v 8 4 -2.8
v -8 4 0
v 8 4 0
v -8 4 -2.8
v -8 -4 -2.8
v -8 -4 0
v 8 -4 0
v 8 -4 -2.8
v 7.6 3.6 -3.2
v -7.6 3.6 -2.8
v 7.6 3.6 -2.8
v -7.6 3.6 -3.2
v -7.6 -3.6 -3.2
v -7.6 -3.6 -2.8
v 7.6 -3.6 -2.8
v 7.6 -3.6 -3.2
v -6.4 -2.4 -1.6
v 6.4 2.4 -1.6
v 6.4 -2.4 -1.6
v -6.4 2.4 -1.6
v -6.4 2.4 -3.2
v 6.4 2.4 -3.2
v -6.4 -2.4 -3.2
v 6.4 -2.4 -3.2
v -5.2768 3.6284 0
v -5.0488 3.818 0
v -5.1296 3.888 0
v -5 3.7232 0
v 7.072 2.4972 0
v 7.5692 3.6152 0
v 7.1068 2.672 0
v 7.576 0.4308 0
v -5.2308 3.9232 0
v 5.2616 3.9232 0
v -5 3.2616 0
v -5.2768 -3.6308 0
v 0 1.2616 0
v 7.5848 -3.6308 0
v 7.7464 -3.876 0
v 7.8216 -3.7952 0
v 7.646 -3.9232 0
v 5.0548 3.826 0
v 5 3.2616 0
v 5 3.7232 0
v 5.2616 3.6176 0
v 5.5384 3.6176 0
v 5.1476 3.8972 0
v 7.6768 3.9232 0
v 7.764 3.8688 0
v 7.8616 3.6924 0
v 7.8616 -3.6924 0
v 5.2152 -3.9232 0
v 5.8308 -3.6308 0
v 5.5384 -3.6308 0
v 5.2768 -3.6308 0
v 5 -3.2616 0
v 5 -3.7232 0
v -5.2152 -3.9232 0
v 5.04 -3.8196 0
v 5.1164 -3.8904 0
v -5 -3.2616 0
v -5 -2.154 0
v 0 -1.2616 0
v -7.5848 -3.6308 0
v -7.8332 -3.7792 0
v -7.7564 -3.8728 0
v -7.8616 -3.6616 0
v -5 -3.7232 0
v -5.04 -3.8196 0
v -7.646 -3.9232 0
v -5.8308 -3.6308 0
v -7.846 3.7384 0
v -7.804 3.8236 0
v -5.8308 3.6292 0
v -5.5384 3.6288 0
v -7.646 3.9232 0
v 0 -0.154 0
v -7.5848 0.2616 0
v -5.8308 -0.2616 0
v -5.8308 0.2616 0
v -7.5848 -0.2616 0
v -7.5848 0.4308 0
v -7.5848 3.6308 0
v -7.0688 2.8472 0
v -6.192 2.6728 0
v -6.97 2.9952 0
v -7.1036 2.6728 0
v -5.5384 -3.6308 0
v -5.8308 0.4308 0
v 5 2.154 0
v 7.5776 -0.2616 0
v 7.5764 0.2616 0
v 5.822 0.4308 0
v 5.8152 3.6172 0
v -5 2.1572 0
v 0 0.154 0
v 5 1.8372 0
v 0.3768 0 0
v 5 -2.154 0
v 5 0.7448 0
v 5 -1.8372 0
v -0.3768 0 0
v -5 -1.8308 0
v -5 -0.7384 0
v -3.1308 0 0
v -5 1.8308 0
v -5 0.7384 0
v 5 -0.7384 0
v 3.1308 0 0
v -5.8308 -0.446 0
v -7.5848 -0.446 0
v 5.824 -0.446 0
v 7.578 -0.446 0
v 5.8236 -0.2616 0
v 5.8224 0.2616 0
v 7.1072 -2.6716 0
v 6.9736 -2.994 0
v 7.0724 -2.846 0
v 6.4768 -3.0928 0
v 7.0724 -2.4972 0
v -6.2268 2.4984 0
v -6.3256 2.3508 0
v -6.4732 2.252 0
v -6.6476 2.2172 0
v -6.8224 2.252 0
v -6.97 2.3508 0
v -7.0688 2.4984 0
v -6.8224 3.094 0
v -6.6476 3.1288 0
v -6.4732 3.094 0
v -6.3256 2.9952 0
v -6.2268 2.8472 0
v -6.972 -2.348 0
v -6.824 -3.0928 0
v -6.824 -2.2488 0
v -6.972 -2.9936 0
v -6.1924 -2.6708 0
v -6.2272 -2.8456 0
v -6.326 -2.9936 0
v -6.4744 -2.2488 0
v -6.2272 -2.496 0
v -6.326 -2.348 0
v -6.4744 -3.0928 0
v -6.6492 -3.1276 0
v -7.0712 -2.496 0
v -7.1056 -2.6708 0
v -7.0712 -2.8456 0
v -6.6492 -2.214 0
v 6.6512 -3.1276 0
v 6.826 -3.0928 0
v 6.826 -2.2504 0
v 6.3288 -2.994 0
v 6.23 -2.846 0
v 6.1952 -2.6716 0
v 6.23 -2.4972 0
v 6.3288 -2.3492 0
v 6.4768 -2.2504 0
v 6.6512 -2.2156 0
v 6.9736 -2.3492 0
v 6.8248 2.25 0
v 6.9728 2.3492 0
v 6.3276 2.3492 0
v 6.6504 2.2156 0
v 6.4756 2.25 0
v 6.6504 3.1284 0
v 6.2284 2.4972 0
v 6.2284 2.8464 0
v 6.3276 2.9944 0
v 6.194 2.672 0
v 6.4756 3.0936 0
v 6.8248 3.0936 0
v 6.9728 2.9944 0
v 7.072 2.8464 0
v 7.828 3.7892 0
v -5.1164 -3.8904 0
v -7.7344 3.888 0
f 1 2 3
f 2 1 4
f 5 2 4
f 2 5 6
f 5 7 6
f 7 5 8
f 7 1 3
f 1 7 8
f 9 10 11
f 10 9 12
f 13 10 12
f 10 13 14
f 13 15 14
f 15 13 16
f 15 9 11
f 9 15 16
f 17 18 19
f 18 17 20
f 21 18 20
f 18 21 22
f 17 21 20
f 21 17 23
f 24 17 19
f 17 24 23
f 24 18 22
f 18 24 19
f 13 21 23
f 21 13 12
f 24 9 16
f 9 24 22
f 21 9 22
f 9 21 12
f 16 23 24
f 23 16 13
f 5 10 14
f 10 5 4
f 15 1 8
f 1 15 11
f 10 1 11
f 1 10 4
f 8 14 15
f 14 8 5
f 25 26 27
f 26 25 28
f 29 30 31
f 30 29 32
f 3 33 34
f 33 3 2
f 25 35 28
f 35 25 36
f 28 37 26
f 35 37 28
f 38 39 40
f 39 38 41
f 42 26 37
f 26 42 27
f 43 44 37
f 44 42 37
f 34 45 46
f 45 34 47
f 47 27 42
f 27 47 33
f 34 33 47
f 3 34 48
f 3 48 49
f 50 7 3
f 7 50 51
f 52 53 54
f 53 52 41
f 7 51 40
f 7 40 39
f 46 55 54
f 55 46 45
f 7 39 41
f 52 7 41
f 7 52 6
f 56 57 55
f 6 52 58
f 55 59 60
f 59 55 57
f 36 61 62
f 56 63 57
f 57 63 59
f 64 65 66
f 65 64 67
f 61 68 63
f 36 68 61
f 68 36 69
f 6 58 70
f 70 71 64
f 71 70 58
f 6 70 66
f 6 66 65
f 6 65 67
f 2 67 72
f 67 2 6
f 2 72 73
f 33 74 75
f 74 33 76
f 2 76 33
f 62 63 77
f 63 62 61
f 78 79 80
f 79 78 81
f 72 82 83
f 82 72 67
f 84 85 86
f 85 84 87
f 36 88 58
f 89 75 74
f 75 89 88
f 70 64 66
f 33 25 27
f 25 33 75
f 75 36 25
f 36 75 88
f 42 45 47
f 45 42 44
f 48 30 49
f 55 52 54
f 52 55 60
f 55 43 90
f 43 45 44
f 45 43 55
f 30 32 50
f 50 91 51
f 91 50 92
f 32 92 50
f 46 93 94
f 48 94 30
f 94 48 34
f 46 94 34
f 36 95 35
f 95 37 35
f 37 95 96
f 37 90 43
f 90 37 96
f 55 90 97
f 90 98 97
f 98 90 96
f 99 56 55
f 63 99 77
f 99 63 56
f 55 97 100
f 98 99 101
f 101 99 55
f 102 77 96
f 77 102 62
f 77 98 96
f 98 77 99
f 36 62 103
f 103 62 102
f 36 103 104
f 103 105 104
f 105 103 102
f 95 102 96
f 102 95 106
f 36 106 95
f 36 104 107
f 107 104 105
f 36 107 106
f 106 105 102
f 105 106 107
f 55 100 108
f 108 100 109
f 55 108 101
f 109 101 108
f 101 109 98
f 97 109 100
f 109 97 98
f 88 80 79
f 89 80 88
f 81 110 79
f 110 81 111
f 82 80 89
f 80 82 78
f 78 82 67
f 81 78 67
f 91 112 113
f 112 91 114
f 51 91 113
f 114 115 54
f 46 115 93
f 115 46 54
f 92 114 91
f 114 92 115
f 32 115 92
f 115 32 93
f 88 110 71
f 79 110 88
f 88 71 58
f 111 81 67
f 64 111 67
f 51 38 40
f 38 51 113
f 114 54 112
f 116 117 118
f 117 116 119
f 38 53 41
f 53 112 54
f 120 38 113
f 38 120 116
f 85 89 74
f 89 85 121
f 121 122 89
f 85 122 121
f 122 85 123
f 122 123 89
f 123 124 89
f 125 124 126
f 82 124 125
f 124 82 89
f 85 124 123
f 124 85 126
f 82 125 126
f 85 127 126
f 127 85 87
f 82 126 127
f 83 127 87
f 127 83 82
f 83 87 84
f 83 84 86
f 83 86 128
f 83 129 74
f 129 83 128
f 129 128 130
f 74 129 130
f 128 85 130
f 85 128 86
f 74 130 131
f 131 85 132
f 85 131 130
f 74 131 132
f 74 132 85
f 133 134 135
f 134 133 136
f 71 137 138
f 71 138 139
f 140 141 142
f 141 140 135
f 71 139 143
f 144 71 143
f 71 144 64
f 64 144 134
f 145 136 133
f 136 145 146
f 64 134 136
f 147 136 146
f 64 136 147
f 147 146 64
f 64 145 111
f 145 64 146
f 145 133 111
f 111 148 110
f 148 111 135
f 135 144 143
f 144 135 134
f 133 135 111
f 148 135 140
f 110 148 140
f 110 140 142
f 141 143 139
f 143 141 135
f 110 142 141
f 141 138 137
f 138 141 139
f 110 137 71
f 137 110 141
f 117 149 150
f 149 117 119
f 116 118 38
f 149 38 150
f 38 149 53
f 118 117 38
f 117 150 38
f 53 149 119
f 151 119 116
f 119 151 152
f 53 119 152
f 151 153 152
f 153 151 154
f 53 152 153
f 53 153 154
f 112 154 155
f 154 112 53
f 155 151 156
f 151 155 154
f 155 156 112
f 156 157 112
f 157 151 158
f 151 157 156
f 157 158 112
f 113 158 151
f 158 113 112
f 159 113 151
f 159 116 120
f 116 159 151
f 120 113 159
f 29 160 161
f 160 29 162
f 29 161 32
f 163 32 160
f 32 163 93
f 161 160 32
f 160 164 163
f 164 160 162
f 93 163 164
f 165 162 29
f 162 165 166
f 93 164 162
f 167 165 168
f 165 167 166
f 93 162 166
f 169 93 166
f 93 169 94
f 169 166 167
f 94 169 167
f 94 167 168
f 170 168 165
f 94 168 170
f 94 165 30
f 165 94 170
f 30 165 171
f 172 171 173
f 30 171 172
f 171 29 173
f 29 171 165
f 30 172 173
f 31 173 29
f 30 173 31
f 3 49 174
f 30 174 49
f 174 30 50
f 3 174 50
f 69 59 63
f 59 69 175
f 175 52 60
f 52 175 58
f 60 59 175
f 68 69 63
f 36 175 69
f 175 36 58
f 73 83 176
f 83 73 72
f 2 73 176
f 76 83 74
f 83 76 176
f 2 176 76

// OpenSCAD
// file: ../p/box5.scad
use <../lib.scad>
function ldraw_lib__box5() = [
// 0 Box with 5 Faces and All Edges
// 0 Name: box5.dat
// 0 Author: James Jessiman
// 0 !LDRAW_ORG Primitive UPDATE 2012-01
// 0 !LICENSE Licensed under CC BY 2.0 and CC BY 4.0 : see CAreadme.txt
// 
// 0 BFC CERTIFY CCW
  [0,"BFC","CERTIFY"],
  [0,"BFC","CCW"],
// 
// 0 !HISTORY 2002-04-03 [sbliss] Modified for BFC compliance
// 0 !HISTORY 2002-04-25 [PTadmin] Official Update 2002-02
// 0 !HISTORY 2007-06-24 [PTadmin] Header formatted for Contributor Agreement
// 0 !HISTORY 2008-07-01 [PTadmin] Official Update 2008-01
// 0 !HISTORY 2012-02-16 [Philo] Changed to CCW
// 0 !HISTORY 2012-03-30 [PTadmin] Official Update 2012-01
// 
// 
// 2 24 1 1 1 -1 1 1
  [2,24,1,1,1,-1,1,1],
// 2 24 -1 1 1 -1 1 -1
  [2,24,-1,1,1,-1,1,-1],
// 2 24 -1 1 -1 1 1 -1
  [2,24,-1,1,-1,1,1,-1],
// 2 24 1 1 -1 1 1 1
  [2,24,1,1,-1,1,1,1],
// 2 24 1 0 1 -1 0 1
  [2,24,1,0,1,-1,0,1],
// 2 24 -1 0 1 -1 0 -1
  [2,24,-1,0,1,-1,0,-1],
// 2 24 -1 0 -1 1 0 -1
  [2,24,-1,0,-1,1,0,-1],
// 2 24 1 0 -1 1 0 1
  [2,24,1,0,-1,1,0,1],
// 2 24 1 0 1 1 1 1
  [2,24,1,0,1,1,1,1],
// 2 24 -1 0 1 -1 1 1
  [2,24,-1,0,1,-1,1,1],
// 2 24 1 0 -1 1 1 -1
  [2,24,1,0,-1,1,1,-1],
// 2 24 -1 0 -1 -1 1 -1
  [2,24,-1,0,-1,-1,1,-1],
// 4 16 -1 1 1 1 1 1 1 1 -1 -1 1 -1
  [4,16,-1,1,1,1,1,1,1,1,-1,-1,1,-1],
// 4 16 -1 1 1 -1 0 1 1 0 1 1 1 1
  [4,16,-1,1,1,-1,0,1,1,0,1,1,1,1],
// 4 16 -1 1 -1 -1 0 -1 -1 0 1 -1 1 1
  [4,16,-1,1,-1,-1,0,-1,-1,0,1,-1,1,1],
// 4 16 1 1 -1 1 0 -1 -1 0 -1 -1 1 -1
  [4,16,1,1,-1,1,0,-1,-1,0,-1,-1,1,-1],
// 4 16 1 1 1 1 0 1 1 0 -1 1 1 -1
  [4,16,1,1,1,1,0,1,1,0,-1,1,1,-1],
];
module ldraw_lib__box5(step=0, col=false, unit=2/5, alt=false, line=0.2, solid=!$preview)
    makepoly(ldraw_lib__box5(), step=step, col=col, unit=unit, alt=alt, line=line, solid=solid);
ldraw_lib__box5(line=0.2);
// file: ../p/box4.scad
use <../lib.scad>
function ldraw_lib__box4() = [
// 0 Box with 4 Faces (2 Parallel Pairs) and All Edges
// 0 Name: box4.dat
// 0 Author: James Jessiman
// 0 !LDRAW_ORG Primitive UPDATE 2012-01
// 0 !LICENSE Licensed under CC BY 2.0 and CC BY 4.0 : see CAreadme.txt
// 
// 0 BFC CERTIFY CCW
  [0,"BFC","CERTIFY"],
  [0,"BFC","CCW"],
// 
// 0 !HISTORY 2002-04-03 [sbliss] Modified for BFC compliance
// 0 !HISTORY 2002-04-25 [PTadmin] Official Update 2002-02
// 0 !HISTORY 2007-06-24 [PTadmin] Header formatted for Contributor Agreement
// 0 !HISTORY 2008-07-01 [PTadmin] Official Update 2008-01
// 0 !HISTORY 2012-02-16 [Philo] Changed to CCW
// 0 !HISTORY 2012-03-30 [PTadmin] Official Update 2012-01
// 
// 
// 2 24 1 1 1 -1 1 1
  [2,24,1,1,1,-1,1,1],
// 2 24 -1 1 1 -1 1 -1
  [2,24,-1,1,1,-1,1,-1],
// 2 24 -1 1 -1 1 1 -1
  [2,24,-1,1,-1,1,1,-1],
// 2 24 1 1 -1 1 1 1
  [2,24,1,1,-1,1,1,1],
// 2 24 1 0 1 -1 0 1
  [2,24,1,0,1,-1,0,1],
// 2 24 -1 0 1 -1 0 -1
  [2,24,-1,0,1,-1,0,-1],
// 2 24 -1 0 -1 1 0 -1
  [2,24,-1,0,-1,1,0,-1],
// 2 24 1 0 -1 1 0 1
  [2,24,1,0,-1,1,0,1],
// 2 24 1 0 1 1 1 1
  [2,24,1,0,1,1,1,1],
// 2 24 -1 0 1 -1 1 1
  [2,24,-1,0,1,-1,1,1],
// 2 24 1 0 -1 1 1 -1
  [2,24,1,0,-1,1,1,-1],
// 2 24 -1 0 -1 -1 1 -1
  [2,24,-1,0,-1,-1,1,-1],
// 4 16 -1 1 1 -1 0 1 1 0 1 1 1 1
  [4,16,-1,1,1,-1,0,1,1,0,1,1,1,1],
// 4 16 -1 1 -1 -1 0 -1 -1 0 1 -1 1 1
  [4,16,-1,1,-1,-1,0,-1,-1,0,1,-1,1,1],
// 4 16 1 1 -1 1 0 -1 -1 0 -1 -1 1 -1
  [4,16,1,1,-1,1,0,-1,-1,0,-1,-1,1,-1],
// 4 16 1 1 1 1 0 1 1 0 -1 1 1 -1
  [4,16,1,1,1,1,0,1,1,0,-1,1,1,-1],
];
module ldraw_lib__box4(step=0, col=false, unit=2/5, alt=false, line=0.2, solid=!$preview)
    makepoly(ldraw_lib__box4(), step=step, col=col, unit=unit, alt=alt, line=line, solid=solid);
ldraw_lib__box4(line=0.2);
// file: s/3069bs01.scad
use <../../lib.scad>
use <../../p/box4.scad>
use <../../p/box5.scad>
function ldraw_lib__s__3069bs01() = [
// 0 ~Tile  1 x  2 with Groove without Top Face
// 0 Name: s\3069bs01.dat
// 0 Author: Santeri Piippo [arezey]
// 0 !LDRAW_ORG Subpart UPDATE 2010-02
// 0 !LICENSE Licensed under CC BY 2.0 and CC BY 4.0 : see CAreadme.txt
// 
// 0 BFC CERTIFY CCW
  [0,"BFC","CERTIFY"],
  [0,"BFC","CCW"],
// 
// 0 !HISTORY 2010-07-05 [PTadmin] Official Update 2010-02
// 
// 
// 1 16 0 0 0 20 0 0 0 7 0 0 0 10 box4.dat
  [1,16,0,0,0,20,0,0,0,7,0,0,0,10, ldraw_lib__box4()],
// 1 16 0 7 0 19 0 0 0 1 0 0 0 9 box4.dat
  [1,16,0,7,0,19,0,0,0,1,0,0,0,9, ldraw_lib__box4()],
// 0 BFC INVERTNEXT
  [0,"BFC","INVERTNEXT"],
// 1 16 0 8 0 16 0 0 0 -4 0 0 0 6 box5.dat
  [1,16,0,8,0,16,0,0,0,-4,0,0,0,6, ldraw_lib__box5()],
// 4 16 -19 8 9 -16 8 6 -16 8 -6 -19 8 -9
  [4,16,-19,8,9,-16,8,6,-16,8,-6,-19,8,-9],
// 4 16 19 8 -9 16 8 -6 16 8 6 19 8 9
  [4,16,19,8,-9,16,8,-6,16,8,6,19,8,9],
// 4 16 19 8 9 16 8 6 -16 8 6 -19 8 9
  [4,16,19,8,9,16,8,6,-16,8,6,-19,8,9],
// 4 16 -19 8 -9 -16 8 -6 16 8 -6 19 8 -9
  [4,16,-19,8,-9,-16,8,-6,16,8,-6,19,8,-9],
// 4 16 -20 7 10 -19 7 9 -19 7 -9 -20 7 -10
  [4,16,-20,7,10,-19,7,9,-19,7,-9,-20,7,-10],
// 4 16 20 7 -10 19 7 -9 19 7 9 20 7 10
  [4,16,20,7,-10,19,7,-9,19,7,9,20,7,10],
// 4 16 20 7 10 19 7 9 -19 7 9 -20 7 10
  [4,16,20,7,10,19,7,9,-19,7,9,-20,7,10],
// 4 16 -20 7 -10 -19 7 -9 19 7 -9 20 7 -10
  [4,16,-20,7,-10,-19,7,-9,19,7,-9,20,7,-10],
// 0 //
];
module ldraw_lib__s__3069bs01(step=0, col=false, unit=2/5, alt=false, line=0.2, solid=!$preview)
    makepoly(ldraw_lib__s__3069bs01(), step=step, col=col, unit=unit, alt=alt, line=line, solid=solid);
ldraw_lib__s__3069bs01(line=0.2);
// main file
use <../lib.scad>
use <s/3069bs01.scad>
function ldraw_lib__3069bpb2() = [
// 0 Tile  1 x  2 with Black and Dark Bluish Grey Crossed Lines and 4 Rivets Pattern
// 0 Name: 3069bpb2.dat
// 0 Author: Rolf Osterthun [Rolf]
// 0 !LDRAW_ORG Part UPDATE 2022-04
// 0 !LICENSE Licensed under CC BY 2.0 and CC BY 4.0 : see CAreadme.txt
// 
// 0 BFC CERTIFY CCW
  [0,"BFC","CERTIFY"],
  [0,"BFC","CCW"],
// 
// 0 !KEYWORDS BrickLink 3069bpb1037, Set 76202
// 
// 0 !HISTORY 2022-07-18 [PTadmin] Official Update 2022-04
// 
// 
// 1 16 0 0 0 1 0 0 0 1 0 0 0 1 s\3069bs01.dat
  [1,16,0,0,0,1,0,0,0,1,0,0,0,1, ldraw_lib__s__3069bs01()],
// 
// 4 0 -12.824 0 9.72 -13.192 0 9.071 -12.5 0 9.308 -12.622 0 9.545
  [4,0,-12.824,0,9.72,-13.192,0,9.071,-12.5,0,9.308,-12.622,0,9.545],
// 4 72 17.767 0 6.68 17.68 0 6.243 18.94 0 1.077 18.923 0 9.038
  [4,72,17.767,0,6.68,17.68,0,6.243,18.94,0,1.077,18.923,0,9.038],
// 4 16 13.154 0 9.808 20 0 10 -20 0 10 -13.077 0 9.808
  [4,16,13.154,0,9.808,20,0,10,-20,0,10,-13.077,0,9.808],
// 4 0 -13.192 0 -9.077 -12.5 0 8.154 -12.5 0 9.308 -13.192 0 9.071
  [4,0,-13.192,0,-9.077,-12.5,0,8.154,-12.5,0,9.308,-13.192,0,9.071],
// 3 16 -12.5 0 9.308 0 0 3.154 -12.622 0 9.545
  [3,16,-12.5,0,9.308,0,0,3.154,-12.622,0,9.545],
// 3 16 -12.5 0 8.154 0 0 3.154 -12.5 0 9.308
  [3,16,-12.5,0,8.154,0,0,3.154,-12.5,0,9.308],
// 4 0 19.554 0 -9.488 18.962 0 -9.077 19.115 0 -9.808 19.366 0 -9.69
  [4,0,19.554,0,-9.488,18.962,0,-9.077,19.115,0,-9.808,19.366,0,-9.69],
// 4 16 -12.824 0 9.72 -12.622 0 9.545 0 0 3.154 12.637 0 9.565
  [4,16,-12.824,0,9.72,-12.622,0,9.545,0,0,3.154,12.637,0,9.565],
// 3 16 12.5 0 8.154 12.5 0 9.308 0 0 3.154
  [3,16,12.5,0,8.154,12.5,0,9.308,0,0,3.154],
// 3 16 12.5 0 9.308 12.637 0 9.565 0 0 3.154
  [3,16,12.5,0,9.308,12.637,0,9.565,0,0,3.154],
// 4 0 13.846 0 9.044 13.154 0 9.808 12.869 0 9.743 13.154 0 9.044
  [4,0,13.846,0,9.044,13.154,0,9.808,12.869,0,9.743,13.154,0,9.044],
// 4 16 -13.077 0 9.808 -12.824 0 9.72 12.637 0 9.565 12.869 0 9.743
  [4,16,-13.077,0,9.808,-12.824,0,9.72,12.637,0,9.565,12.869,0,9.743],
// 3 16 13.154 0 9.808 -13.077 0 9.808 12.869 0 9.743
  [3,16,13.154,0,9.808,-13.077,0,9.808,12.869,0,9.743],
// 3 16 20 0 10 13.154 0 9.808 19.192 0 9.808
  [3,16,20,0,10,13.154,0,9.808,19.192,0,9.808],
// 3 16 20 0 10 19.192 0 9.808 19.41 0 9.672
  [3,16,20,0,10,19.192,0,9.808,19.41,0,9.672],
// 4 16 19.654 0 -9.231 20 0 -10 20 0 10 19.654 0 9.231
  [4,16,19.654,0,-9.231,20,0,-10,20,0,10,19.654,0,9.231],
// 4 0 14.577 0 -9.077 13.846 0 -9.077 13.038 0 -9.808 19.115 0 -9.808
  [4,0,14.577,0,-9.077,13.846,0,-9.077,13.038,0,-9.808,19.115,0,-9.808],
// 3 16 20 0 -10 19.654 0 -9.231 19.554 0 -9.488
  [3,16,20,0,-10,19.654,0,-9.231,19.554,0,-9.488],
// 3 16 20 0 -10 19.554 0 -9.488 19.366 0 -9.69
  [3,16,20,0,-10,19.554,0,-9.488,19.366,0,-9.69],
// 4 72 13.154 0 9.044 13.192 0 -9.077 13.846 0 -9.077 13.846 0 9.044
  [4,72,13.154,0,9.044,13.192,0,-9.077,13.846,0,-9.077,13.846,0,9.044],
// 3 16 20 0 -10 19.366 0 -9.69 19.115 0 -9.808
  [3,16,20,0,-10,19.366,0,-9.69,19.115,0,-9.808],
// 4 16 19.115 0 -9.808 13.038 0 -9.808 -20 0 -10 20 0 -10
  [4,16,19.115,0,-9.808,13.038,0,-9.808,-20,0,-10,20,0,-10],
// 3 0 12.5 0 -8.154 12.5 0 -9.308 13.192 0 -9.077
  [3,0,12.5,0,-8.154,12.5,0,-9.308,13.192,0,-9.077],
// 3 16 -20 0 -10 13.038 0 -9.808 -13.038 0 -9.808
  [3,16,-20,0,-10,13.038,0,-9.808,-13.038,0,-9.808],
// 4 0 12.5 0 -9.308 12.6 0 -9.549 12.791 0 -9.726 13.192 0 -9.077
  [4,0,12.5,0,-9.308,12.6,0,-9.549,12.791,0,-9.726,13.192,0,-9.077],
// 3 0 -13.192 0 -9.077 -12.5 0 -8.154 -12.5 0 -5.385
  [3,0,-13.192,0,-9.077,-12.5,0,-8.154,-12.5,0,-5.385],
// 3 16 12.5 0 -8.154 0 0 -3.154 12.5 0 -9.308
  [3,16,12.5,0,-8.154,0,0,-3.154,12.5,0,-9.308],
// 3 16 12.5 0 -9.308 0 0 -3.154 12.6 0 -9.549
  [3,16,12.5,0,-9.308,0,0,-3.154,12.6,0,-9.549],
// 4 0 -19.654 0 -9.154 -19.583 0 -9.448 -19.391 0 -9.682 -18.962 0 -9.077
  [4,0,-19.654,0,-9.154,-19.583,0,-9.448,-19.391,0,-9.682,-18.962,0,-9.077],
// 3 16 -12.5 0 -8.154 -12.5 0 -9.308 0 0 -3.154
  [3,16,-12.5,0,-8.154,-12.5,0,-9.308,0,0,-3.154],
// 4 0 -12.5 0 -8.154 -13.192 0 -9.077 -12.6 0 -9.549 -12.5 0 -9.308
  [4,0,-12.5,0,-8.154,-13.192,0,-9.077,-12.6,0,-9.549,-12.5,0,-9.308],
// 3 16 -20 0 -10 -13.038 0 -9.808 -19.115 0 -9.808
  [3,16,-20,0,-10,-13.038,0,-9.808,-19.115,0,-9.808],
// 4 0 -18.962 0 -9.077 -19.115 0 -9.808 -13.038 0 -9.808 -14.577 0 -9.077
  [4,0,-18.962,0,-9.077,-19.115,0,-9.808,-13.038,0,-9.808,-14.577,0,-9.077],
// 3 16 -20 0 -10 -19.115 0 -9.808 -19.391 0 -9.682
  [3,16,-20,0,-10,-19.115,0,-9.808,-19.391,0,-9.682],
// 3 16 -20 0 -10 -19.391 0 -9.682 -19.583 0 -9.448
  [3,16,-20,0,-10,-19.391,0,-9.682,-19.583,0,-9.448],
// 3 16 -20 0 -10 -19.583 0 -9.448 -19.654 0 -9.154
  [3,16,-20,0,-10,-19.583,0,-9.448,-19.654,0,-9.154],
// 4 16 -19.615 0 9.346 -20 0 10 -20 0 -10 -19.654 0 -9.154
  [4,16,-19.615,0,9.346,-20,0,10,-20,0,-10,-19.654,0,-9.154],
// 3 16 -20 0 10 -19.615 0 9.346 -19.51 0 9.559
  [3,16,-20,0,10,-19.615,0,9.346,-19.51,0,9.559],
// 4 0 -13.846 0 9.072 -13.077 0 9.808 -19.115 0 9.808 -14.577 0 9.073
  [4,0,-13.846,0,9.072,-13.077,0,9.808,-19.115,0,9.808,-14.577,0,9.073],
// 3 16 -20 0 10 -19.115 0 9.808 -13.077 0 9.808
  [3,16,-20,0,10,-19.115,0,9.808,-13.077,0,9.808],
// 4 0 -12.5 0 -5.385 -12.5 0 -8.154 0 0 -3.154 0 0 -.385
  [4,0,-12.5,0,-5.385,-12.5,0,-8.154,0,0,-3.154,0,0,-.385],
// 4 72 -18.962 0 .654 -18.962 0 -.654 -14.577 0 -.654 -14.577 0 .654
  [4,72,-18.962,0,.654,-18.962,0,-.654,-14.577,0,-.654,-14.577,0,.654],
// 4 0 -18.962 0 9.077 -19.615 0 9.346 -19.654 0 -9.154 -18.962 0 1.077
  [4,0,-18.962,0,9.077,-19.615,0,9.346,-19.654,0,-9.154,-18.962,0,1.077],
// 4 0 -17.425 0 7.488 -17.672 0 7.118 -17.759 0 6.682 -15.48 0 6.682
  [4,0,-17.425,0,7.488,-17.672,0,7.118,-17.759,0,6.682,-15.48,0,6.682],
// 3 0 -13.192 0 -9.077 -13.846 0 -9.077 -13.038 0 -9.808
  [3,0,-13.192,0,-9.077,-13.846,0,-9.077,-13.038,0,-9.808],
// 4 0 -13.846 0 9.072 -14.577 0 9.073 -14.577 0 1.077 -13.846 0 -9.077
  [4,0,-13.846,0,9.072,-14.577,0,9.073,-14.577,0,1.077,-13.846,0,-9.077],
// 3 0 -19.115 0 -9.808 -18.962 0 -9.077 -19.391 0 -9.682
  [3,0,-19.115,0,-9.808,-18.962,0,-9.077,-19.391,0,-9.682],
// 4 0 -12.824 0 9.72 -13.077 0 9.808 -13.846 0 9.072 -13.192 0 9.071
  [4,0,-12.824,0,9.72,-13.077,0,9.808,-13.846,0,9.072,-13.192,0,9.071],
// 4 72 -13.192 0 -9.077 -13.192 0 9.071 -13.846 0 9.072 -13.846 0 -9.077
  [4,72,-13.192,0,-9.077,-13.192,0,9.071,-13.846,0,9.072,-13.846,0,-9.077],
// 4 0 12.869 0 9.743 12.637 0 9.565 12.5 0 9.308 13.154 0 9.044
  [4,0,12.869,0,9.743,12.637,0,9.565,12.5,0,9.308,13.154,0,9.044],
// 3 0 19.192 0 9.808 18.923 0 9.038 19.41 0 9.672
  [3,0,19.192,0,9.808,18.923,0,9.038,19.41,0,9.672],
// 4 0 12.791 0 -9.726 13.038 0 -9.808 13.846 0 -9.077 13.192 0 -9.077
  [4,0,12.791,0,-9.726,13.038,0,-9.808,13.846,0,-9.077,13.192,0,-9.077],
// 3 0 13.192 0 -9.077 12.5 0 8.154 12.5 0 5.385
  [3,0,13.192,0,-9.077,12.5,0,8.154,12.5,0,5.385],
// 4 0 12.5 0 9.308 12.5 0 8.154 13.192 0 -9.077 13.154 0 9.044
  [4,0,12.5,0,9.308,12.5,0,8.154,13.192,0,-9.077,13.154,0,9.044],
// 3 0 18.923 0 9.038 18.94 0 1.077 19.654 0 9.231
  [3,0,18.923,0,9.038,18.94,0,1.077,19.654,0,9.231],
// 4 0 18.941 0 .654 18.944 0 -.654 19.654 0 -9.231 19.654 0 9.231
  [4,0,18.941,0,.654,18.944,0,-.654,19.654,0,-9.231,19.654,0,9.231],
// 3 0 18.94 0 1.077 18.941 0 .654 19.654 0 9.231
  [3,0,18.94,0,1.077,18.941,0,.654,19.654,0,9.231],
// 3 0 13.846 0 9.044 14.555 0 1.077 14.538 0 9.043
  [3,0,13.846,0,9.044,14.555,0,1.077,14.538,0,9.043],
// 4 0 13.154 0 9.808 14.538 0 9.043 18.923 0 9.038 19.192 0 9.808
  [4,0,13.154,0,9.808,14.538,0,9.043,18.923,0,9.038,19.192,0,9.808],
// 3 0 13.846 0 9.044 14.538 0 9.043 13.154 0 9.808
  [3,0,13.846,0,9.044,14.538,0,9.043,13.154,0,9.808],
// 3 0 -13.192 0 -9.077 -12.5 0 5.393 -12.5 0 8.154
  [3,0,-13.192,0,-9.077,-12.5,0,5.393,-12.5,0,8.154],
// 4 0 0 0 .385 0 0 3.154 -12.5 0 8.154 -12.5 0 5.393
  [4,0,0,0,.385,0,0,3.154,-12.5,0,8.154,-12.5,0,5.393],
// 4 0 12.5 0 5.385 12.5 0 8.154 0 0 3.154 0 0 .385
  [4,0,12.5,0,5.385,12.5,0,8.154,0,0,3.154,0,0,.385],
// 3 0 13.192 0 -9.077 12.5 0 5.385 12.5 0 4.593
  [3,0,13.192,0,-9.077,12.5,0,5.385,12.5,0,4.593],
// 4 72 0 0 .385 .942 0 0 12.5 0 4.593 12.5 0 5.385
  [4,72,0,0,.385,.942,0,0,12.5,0,4.593,12.5,0,5.385],
// 3 0 12.5 0 -5.385 12.5 0 -8.154 13.192 0 -9.077
  [3,0,12.5,0,-5.385,12.5,0,-8.154,13.192,0,-9.077],
// 4 0 0 0 -.385 0 0 -3.154 12.5 0 -8.154 12.5 0 -5.385
  [4,0,0,0,-.385,0,0,-3.154,12.5,0,-8.154,12.5,0,-5.385],
// 3 0 13.192 0 -9.077 12.5 0 4.593 12.5 0 1.862
  [3,0,13.192,0,-9.077,12.5,0,4.593,12.5,0,1.862],
// 3 72 .942 0 0 12.5 0 -5.385 12.5 0 -4.593
  [3,72,.942,0,0,12.5,0,-5.385,12.5,0,-4.593],
// 3 0 12.5 0 -4.593 12.5 0 -5.385 13.192 0 -9.077
  [3,0,12.5,0,-4.593,12.5,0,-5.385,13.192,0,-9.077],
// 4 72 -12.5 0 -5.385 0 0 -.385 0 0 .385 -.942 0 0
  [4,72,-12.5,0,-5.385,0,0,-.385,0,0,.385,-.942,0,0],
// 4 72 .942 0 0 0 0 .385 0 0 -.385 12.5 0 -5.385
  [4,72,.942,0,0,0,0,.385,0,0,-.385,12.5,0,-5.385],
// 3 0 -13.192 0 -9.077 -12.5 0 -5.385 -12.5 0 -4.577
  [3,0,-13.192,0,-9.077,-12.5,0,-5.385,-12.5,0,-4.577],
// 3 72 -12.5 0 -4.577 -12.5 0 -5.385 -.942 0 0
  [3,72,-12.5,0,-4.577,-12.5,0,-5.385,-.942,0,0],
// 3 0 -13.192 0 -9.077 -12.5 0 -4.577 -12.5 0 -1.846
  [3,0,-13.192,0,-9.077,-12.5,0,-4.577,-12.5,0,-1.846],
// 4 0 -.942 0 0 -7.827 0 0 -12.5 0 -1.846 -12.5 0 -4.577
  [4,0,-.942,0,0,-7.827,0,0,-12.5,0,-1.846,-12.5,0,-4.577],
// 4 72 -12.5 0 4.577 -.942 0 0 0 0 .385 -12.5 0 5.393
  [4,72,-12.5,0,4.577,-.942,0,0,0,0,.385,-12.5,0,5.393],
// 3 0 -13.192 0 -9.077 -12.5 0 4.577 -12.5 0 5.393
  [3,0,-13.192,0,-9.077,-12.5,0,4.577,-12.5,0,5.393],
// 3 0 -13.192 0 -9.077 -12.5 0 -1.846 -12.5 0 1.846
  [3,0,-13.192,0,-9.077,-12.5,0,-1.846,-12.5,0,1.846],
// 3 16 -12.5 0 1.846 -12.5 0 -1.846 -7.827 0 0
  [3,16,-12.5,0,1.846,-12.5,0,-1.846,-7.827,0,0],
// 3 0 -13.192 0 -9.077 -12.5 0 1.846 -12.5 0 4.577
  [3,0,-13.192,0,-9.077,-12.5,0,1.846,-12.5,0,4.577],
// 4 0 -.942 0 0 -12.5 0 4.577 -12.5 0 1.846 -7.827 0 0
  [4,0,-.942,0,0,-12.5,0,4.577,-12.5,0,1.846,-7.827,0,0],
// 3 0 13.192 0 -9.077 12.5 0 1.862 12.5 0 -1.846
  [3,0,13.192,0,-9.077,12.5,0,1.862,12.5,0,-1.846],
// 3 16 12.5 0 -1.846 12.5 0 1.862 7.827 0 0
  [3,16,12.5,0,-1.846,12.5,0,1.862,7.827,0,0],
// 3 0 13.192 0 -9.077 12.5 0 -1.846 12.5 0 -4.593
  [3,0,13.192,0,-9.077,12.5,0,-1.846,12.5,0,-4.593],
// 4 0 12.5 0 -1.846 7.827 0 0 .942 0 0 12.5 0 -4.593
  [4,0,12.5,0,-1.846,7.827,0,0,.942,0,0,12.5,0,-4.593],
// 4 0 12.5 0 1.862 12.5 0 4.593 .942 0 0 7.827 0 0
  [4,0,12.5,0,1.862,12.5,0,4.593,.942,0,0,7.827,0,0],
// 3 0 -13.846 0 -9.077 -14.577 0 .654 -14.577 0 -.654
  [3,0,-13.846,0,-9.077,-14.577,0,.654,-14.577,0,-.654],
// 3 0 -14.577 0 1.077 -14.577 0 .654 -13.846 0 -9.077
  [3,0,-14.577,0,1.077,-14.577,0,.654,-13.846,0,-9.077],
// 4 0 -18.962 0 -1.115 -14.577 0 -1.115 -14.577 0 -.654 -18.962 0 -.654
  [4,0,-18.962,0,-1.115,-14.577,0,-1.115,-14.577,0,-.654,-18.962,0,-.654],
// 4 0 -14.577 0 1.077 -18.962 0 1.077 -18.962 0 .654 -14.577 0 .654
  [4,0,-14.577,0,1.077,-18.962,0,1.077,-18.962,0,.654,-14.577,0,.654],
// 3 0 -18.962 0 .654 -18.962 0 1.077 -19.654 0 -9.154
  [3,0,-18.962,0,.654,-18.962,0,1.077,-19.654,0,-9.154],
// 3 0 -18.962 0 -.654 -18.962 0 .654 -19.654 0 -9.154
  [3,0,-18.962,0,-.654,-18.962,0,.654,-19.654,0,-9.154],
// 4 0 14.559 0 -.654 14.56 0 -1.115 18.945 0 -1.115 18.944 0 -.654
  [4,0,14.559,0,-.654,14.56,0,-1.115,18.945,0,-1.115,18.944,0,-.654],
// 3 0 19.654 0 -9.231 18.944 0 -.654 18.945 0 -1.115
  [3,0,19.654,0,-9.231,18.944,0,-.654,18.945,0,-1.115],
// 3 0 14.559 0 -.654 14.556 0 .654 13.846 0 -9.077
  [3,0,14.559,0,-.654,14.556,0,.654,13.846,0,-9.077],
// 4 0 14.555 0 1.077 13.846 0 9.044 13.846 0 -9.077 14.556 0 .654
  [4,0,14.555,0,1.077,13.846,0,9.044,13.846,0,-9.077,14.556,0,.654],
// 4 72 18.944 0 -.654 18.941 0 .654 14.556 0 .654 14.559 0 -.654
  [4,72,18.944,0,-.654,18.941,0,.654,14.556,0,.654,14.559,0,-.654],
// 4 0 18.941 0 .654 18.94 0 1.077 14.555 0 1.077 14.556 0 .654
  [4,0,18.941,0,.654,18.94,0,1.077,14.555,0,1.077,14.556,0,.654],
// 3 0 -13.846 0 -9.077 -14.577 0 -1.115 -14.577 0 -9.077
  [3,0,-13.846,0,-9.077,-14.577,0,-1.115,-14.577,0,-9.077],
// 3 0 -14.577 0 -.654 -14.577 0 -1.115 -13.846 0 -9.077
  [3,0,-14.577,0,-.654,-14.577,0,-1.115,-13.846,0,-9.077],
// 3 0 -13.846 0 -9.077 -14.577 0 -9.077 -13.038 0 -9.808
  [3,0,-13.846,0,-9.077,-14.577,0,-9.077,-13.038,0,-9.808],
// 3 0 -18.962 0 -1.115 -18.962 0 -.654 -19.654 0 -9.154
  [3,0,-18.962,0,-1.115,-18.962,0,-.654,-19.654,0,-9.154],
// 3 0 -18.962 0 -9.077 -18.962 0 -1.115 -19.654 0 -9.154
  [3,0,-18.962,0,-9.077,-18.962,0,-1.115,-19.654,0,-9.154],
// 4 0 19.554 0 -9.488 19.654 0 -9.231 18.945 0 -1.115 18.962 0 -9.077
  [4,0,19.554,0,-9.488,19.654,0,-9.231,18.945,0,-1.115,18.962,0,-9.077],
// 3 0 14.559 0 -.654 13.846 0 -9.077 14.56 0 -1.115
  [3,0,14.559,0,-.654,13.846,0,-9.077,14.56,0,-1.115],
// 4 0 17.681 0 -7.115 17.768 0 -6.679 16.192 0 -7.732 17.434 0 -7.485
  [4,0,17.681,0,-7.115,17.768,0,-6.679,16.192,0,-7.732,17.434,0,-7.485],
// 3 0 18.962 0 -9.077 14.577 0 -9.077 19.115 0 -9.808
  [3,0,18.962,0,-9.077,14.577,0,-9.077,19.115,0,-9.808],
// 3 0 14.577 0 -9.077 14.56 0 -1.115 13.846 0 -9.077
  [3,0,14.577,0,-9.077,14.56,0,-1.115,13.846,0,-9.077],
// 4 72 17.768 0 -6.679 18.962 0 -9.077 18.945 0 -1.115 17.681 0 -6.243
  [4,72,17.768,0,-6.679,18.962,0,-9.077,18.945,0,-1.115,17.681,0,-6.243],
// 4 72 -14.577 0 9.073 -15.48 0 6.682 -15.567 0 6.246 -14.577 0 1.077
  [4,72,-14.577,0,9.073,-15.48,0,6.682,-15.567,0,6.246,-14.577,0,1.077],
// 3 72 -15.567 0 6.246 -15.814 0 5.877 -14.577 0 1.077
  [3,72,-15.567,0,6.246,-15.814,0,5.877,-14.577,0,1.077],
// 4 0 -15.567 0 6.246 -15.48 0 6.682 -16.183 0 5.63 -15.814 0 5.877
  [4,0,-15.567,0,6.246,-15.48,0,6.682,-16.183,0,5.63,-15.814,0,5.877],
// 3 72 -15.814 0 5.877 -16.183 0 5.63 -14.577 0 1.077
  [3,72,-15.814,0,5.877,-16.183,0,5.63,-14.577,0,1.077],
// 3 72 -16.183 0 5.63 -16.619 0 5.543 -14.577 0 1.077
  [3,72,-16.183,0,5.63,-16.619,0,5.543,-14.577,0,1.077],
// 3 0 -17.056 0 5.63 -16.619 0 5.543 -17.425 0 5.877
  [3,0,-17.056,0,5.63,-16.619,0,5.543,-17.425,0,5.877],
// 4 72 -14.577 0 1.077 -16.619 0 5.543 -17.056 0 5.63 -18.962 0 1.077
  [4,72,-14.577,0,1.077,-16.619,0,5.543,-17.056,0,5.63,-18.962,0,1.077],
// 4 0 -16.183 0 5.63 -15.48 0 6.682 -17.425 0 5.877 -16.619 0 5.543
  [4,0,-16.183,0,5.63,-15.48,0,6.682,-17.425,0,5.877,-16.619,0,5.543],
// 3 72 -18.962 0 1.077 -17.056 0 5.63 -17.425 0 5.877
  [3,72,-18.962,0,1.077,-17.056,0,5.63,-17.425,0,5.877],
// 4 0 -17.759 0 6.682 -17.672 0 6.246 -17.425 0 5.877 -15.48 0 6.682
  [4,0,-17.759,0,6.682,-17.672,0,6.246,-17.425,0,5.877,-15.48,0,6.682],
// 3 72 -18.962 0 1.077 -17.425 0 5.877 -17.672 0 6.246
  [3,72,-18.962,0,1.077,-17.425,0,5.877,-17.672,0,6.246],
// 4 72 -17.759 0 6.682 -18.962 0 9.077 -18.962 0 1.077 -17.672 0 6.246
  [4,72,-17.759,0,6.682,-18.962,0,9.077,-18.962,0,1.077,-17.672,0,6.246],
// 3 72 -18.962 0 9.077 -17.759 0 6.682 -17.672 0 7.118
  [3,72,-18.962,0,9.077,-17.759,0,6.682,-17.672,0,7.118],
// 3 72 -18.962 0 9.077 -17.672 0 7.118 -17.425 0 7.488
  [3,72,-18.962,0,9.077,-17.672,0,7.118,-17.425,0,7.488],
// 3 72 -18.962 0 9.077 -17.425 0 7.488 -17.056 0 7.735
  [3,72,-18.962,0,9.077,-17.425,0,7.488,-17.056,0,7.735],
// 4 72 -17.056 0 7.735 -16.619 0 7.822 -14.577 0 9.073 -18.962 0 9.077
  [4,72,-17.056,0,7.735,-16.619,0,7.822,-14.577,0,9.073,-18.962,0,9.077],
// 3 0 -16.619 0 7.822 -17.056 0 7.735 -16.183 0 7.735
  [3,0,-16.619,0,7.822,-17.056,0,7.735,-16.183,0,7.735],
// 3 72 -14.577 0 9.073 -16.619 0 7.822 -16.183 0 7.735
  [3,72,-14.577,0,9.073,-16.619,0,7.822,-16.183,0,7.735],
// 4 0 -17.425 0 7.488 -15.48 0 6.682 -16.183 0 7.735 -17.056 0 7.735
  [4,0,-17.425,0,7.488,-15.48,0,6.682,-16.183,0,7.735,-17.056,0,7.735],
// 3 72 -14.577 0 9.073 -16.183 0 7.735 -15.814 0 7.488
  [3,72,-14.577,0,9.073,-16.183,0,7.735,-15.814,0,7.488],
// 4 0 -15.567 0 7.118 -15.814 0 7.488 -16.183 0 7.735 -15.48 0 6.682
  [4,0,-15.567,0,7.118,-15.814,0,7.488,-16.183,0,7.735,-15.48,0,6.682],
// 3 72 -14.577 0 9.073 -15.814 0 7.488 -15.567 0 7.118
  [3,72,-14.577,0,9.073,-15.814,0,7.488,-15.567,0,7.118],
// 3 72 -14.577 0 9.073 -15.567 0 7.118 -15.48 0 6.682
  [3,72,-14.577,0,9.073,-15.567,0,7.118,-15.48,0,6.682],
// 4 0 -17.43 0 -7.484 -17.06 0 -7.732 -17.06 0 -5.622 -17.43 0 -5.87
  [4,0,-17.43,0,-7.484,-17.06,0,-7.732,-17.06,0,-5.622,-17.43,0,-5.87],
// 3 72 -14.577 0 -9.077 -15.481 0 -6.677 -15.568 0 -7.114
  [3,72,-14.577,0,-9.077,-15.481,0,-6.677,-15.568,0,-7.114],
// 3 72 -14.577 0 -9.077 -15.568 0 -7.114 -15.815 0 -7.484
  [3,72,-14.577,0,-9.077,-15.568,0,-7.114,-15.815,0,-7.484],
// 4 0 -15.815 0 -5.87 -16.186 0 -5.622 -17.06 0 -5.622 -15.568 0 -6.24
  [4,0,-15.815,0,-5.87,-16.186,0,-5.622,-17.06,0,-5.622,-15.568,0,-6.24],
// 3 72 -14.577 0 -9.077 -15.815 0 -7.484 -16.186 0 -7.732
  [3,72,-14.577,0,-9.077,-15.815,0,-7.484,-16.186,0,-7.732],
// 4 72 -16.186 0 -7.732 -16.623 0 -7.819 -18.962 0 -9.077 -14.577 0 -9.077
  [4,72,-16.186,0,-7.732,-16.623,0,-7.819,-18.962,0,-9.077,-14.577,0,-9.077],
// 3 72 -18.962 0 -9.077 -16.623 0 -7.819 -17.06 0 -7.732
  [3,72,-18.962,0,-9.077,-16.623,0,-7.819,-17.06,0,-7.732],
// 4 0 -17.764 0 -6.677 -17.43 0 -7.484 -17.43 0 -5.87 -17.678 0 -6.24
  [4,0,-17.764,0,-6.677,-17.43,0,-7.484,-17.43,0,-5.87,-17.678,0,-6.24],
// 3 72 -18.962 0 -9.077 -17.06 0 -7.732 -17.43 0 -7.484
  [3,72,-18.962,0,-9.077,-17.06,0,-7.732,-17.43,0,-7.484],
// 3 0 -17.678 0 -7.114 -17.43 0 -7.484 -17.764 0 -6.677
  [3,0,-17.678,0,-7.114,-17.43,0,-7.484,-17.764,0,-6.677],
// 3 72 -18.962 0 -9.077 -17.43 0 -7.484 -17.678 0 -7.114
  [3,72,-18.962,0,-9.077,-17.43,0,-7.484,-17.678,0,-7.114],
// 3 72 -17.678 0 -7.114 -17.764 0 -6.677 -18.962 0 -9.077
  [3,72,-17.678,0,-7.114,-17.764,0,-6.677,-18.962,0,-9.077],
// 4 72 -17.764 0 -6.677 -17.678 0 -6.24 -18.962 0 -1.115 -18.962 0 -9.077
  [4,72,-17.764,0,-6.677,-17.678,0,-6.24,-18.962,0,-1.115,-18.962,0,-9.077],
// 3 72 -17.678 0 -6.24 -17.43 0 -5.87 -18.962 0 -1.115
  [3,72,-17.678,0,-6.24,-17.43,0,-5.87,-18.962,0,-1.115],
// 4 72 -17.06 0 -5.622 -16.623 0 -5.535 -14.577 0 -1.115 -18.962 0 -1.115
  [4,72,-17.06,0,-5.622,-16.623,0,-5.535,-14.577,0,-1.115,-18.962,0,-1.115],
// 4 0 -17.06 0 -7.732 -16.623 0 -7.819 -16.186 0 -7.732 -17.06 0 -5.622
  [4,0,-17.06,0,-7.732,-16.623,0,-7.819,-16.186,0,-7.732,-17.06,0,-5.622],
// 3 72 -17.43 0 -5.87 -17.06 0 -5.622 -18.962 0 -1.115
  [3,72,-17.43,0,-5.87,-17.06,0,-5.622,-18.962,0,-1.115],
// 3 0 -16.623 0 -5.535 -17.06 0 -5.622 -16.186 0 -5.622
  [3,0,-16.623,0,-5.535,-17.06,0,-5.622,-16.186,0,-5.622],
// 3 72 -14.577 0 -1.115 -16.623 0 -5.535 -16.186 0 -5.622
  [3,72,-14.577,0,-1.115,-16.623,0,-5.535,-16.186,0,-5.622],
// 3 72 -14.577 0 -1.115 -16.186 0 -5.622 -15.815 0 -5.87
  [3,72,-14.577,0,-1.115,-16.186,0,-5.622,-15.815,0,-5.87],
// 4 0 -17.06 0 -5.622 -16.186 0 -7.732 -15.815 0 -7.484 -15.568 0 -6.24
  [4,0,-17.06,0,-5.622,-16.186,0,-7.732,-15.815,0,-7.484,-15.568,0,-6.24],
// 3 72 -14.577 0 -1.115 -15.815 0 -5.87 -15.568 0 -6.24
  [3,72,-14.577,0,-1.115,-15.815,0,-5.87,-15.568,0,-6.24],
// 4 0 -15.568 0 -7.114 -15.481 0 -6.677 -15.568 0 -6.24 -15.815 0 -7.484
  [4,0,-15.568,0,-7.114,-15.481,0,-6.677,-15.568,0,-6.24,-15.815,0,-7.484],
// 4 72 -14.577 0 -9.077 -14.577 0 -1.115 -15.568 0 -6.24 -15.481 0 -6.677
  [4,72,-14.577,0,-9.077,-14.577,0,-1.115,-15.568,0,-6.24,-15.481,0,-6.677],
// 4 0 16.192 0 -7.732 16.628 0 -7.819 17.065 0 -7.732 17.434 0 -7.485
  [4,0,16.192,0,-7.732,16.628,0,-7.819,17.065,0,-7.732,17.434,0,-7.485],
// 3 72 17.768 0 -6.679 17.681 0 -7.115 18.962 0 -9.077
  [3,72,17.768,0,-6.679,17.681,0,-7.115,18.962,0,-9.077],
// 4 72 14.577 0 -9.077 18.962 0 -9.077 17.065 0 -7.732 16.628 0 -7.819
  [4,72,14.577,0,-9.077,18.962,0,-9.077,17.065,0,-7.732,16.628,0,-7.819],
// 3 72 17.681 0 -7.115 17.434 0 -7.485 18.962 0 -9.077
  [3,72,17.681,0,-7.115,17.434,0,-7.485,18.962,0,-9.077],
// 3 72 17.434 0 -7.485 17.065 0 -7.732 18.962 0 -9.077
  [3,72,17.434,0,-7.485,17.065,0,-7.732,18.962,0,-9.077],
// 3 72 14.577 0 -9.077 16.628 0 -7.819 16.192 0 -7.732
  [3,72,14.577,0,-9.077,16.628,0,-7.819,16.192,0,-7.732],
// 4 0 17.065 0 -5.626 15.822 0 -7.485 16.192 0 -7.732 17.768 0 -6.679
  [4,0,17.065,0,-5.626,15.822,0,-7.485,16.192,0,-7.732,17.768,0,-6.679],
// 3 72 14.577 0 -9.077 16.192 0 -7.732 15.822 0 -7.485
  [3,72,14.577,0,-9.077,16.192,0,-7.732,15.822,0,-7.485],
// 4 0 15.488 0 -6.679 15.575 0 -7.115 15.822 0 -7.485 17.065 0 -5.626
  [4,0,15.488,0,-6.679,15.575,0,-7.115,15.822,0,-7.485,17.065,0,-5.626],
// 3 72 14.577 0 -9.077 15.822 0 -7.485 15.575 0 -7.115
  [3,72,14.577,0,-9.077,15.822,0,-7.485,15.575,0,-7.115],
// 3 72 14.577 0 -9.077 15.575 0 -7.115 15.488 0 -6.679
  [3,72,14.577,0,-9.077,15.575,0,-7.115,15.488,0,-6.679],
// 4 72 15.575 0 -6.243 14.56 0 -1.115 14.577 0 -9.077 15.488 0 -6.679
  [4,72,15.575,0,-6.243,14.56,0,-1.115,14.577,0,-9.077,15.488,0,-6.679],
// 4 0 17.065 0 -5.626 15.822 0 -5.873 15.575 0 -6.243 15.488 0 -6.679
  [4,0,17.065,0,-5.626,15.822,0,-5.873,15.575,0,-6.243,15.488,0,-6.679],
// 3 72 15.575 0 -6.243 15.822 0 -5.873 14.56 0 -1.115
  [3,72,15.575,0,-6.243,15.822,0,-5.873,14.56,0,-1.115],
// 3 72 15.822 0 -5.873 16.192 0 -5.626 14.56 0 -1.115
  [3,72,15.822,0,-5.873,16.192,0,-5.626,14.56,0,-1.115],
// 4 0 15.822 0 -5.873 17.065 0 -5.626 16.628 0 -5.539 16.192 0 -5.626
  [4,0,15.822,0,-5.873,17.065,0,-5.626,16.628,0,-5.539,16.192,0,-5.626],
// 3 72 16.192 0 -5.626 16.628 0 -5.539 14.56 0 -1.115
  [3,72,16.192,0,-5.626,16.628,0,-5.539,14.56,0,-1.115],
// 4 72 14.56 0 -1.115 16.628 0 -5.539 17.065 0 -5.626 18.945 0 -1.115
  [4,72,14.56,0,-1.115,16.628,0,-5.539,17.065,0,-5.626,18.945,0,-1.115],
// 3 72 17.434 0 -5.873 18.945 0 -1.115 17.065 0 -5.626
  [3,72,17.434,0,-5.873,18.945,0,-1.115,17.065,0,-5.626],
// 4 0 17.681 0 -6.243 17.434 0 -5.873 17.065 0 -5.626 17.768 0 -6.679
  [4,0,17.681,0,-6.243,17.434,0,-5.873,17.065,0,-5.626,17.768,0,-6.679],
// 3 72 17.681 0 -6.243 18.945 0 -1.115 17.434 0 -5.873
  [3,72,17.681,0,-6.243,18.945,0,-1.115,17.434,0,-5.873],
// 4 0 15.819 0 5.873 17.062 0 5.625 17.432 0 5.873 17.68 0 6.243
  [4,0,15.819,0,5.873,17.062,0,5.625,17.432,0,5.873,17.68,0,6.243],
// 3 72 17.68 0 6.243 17.432 0 5.873 18.94 0 1.077
  [3,72,17.68,0,6.243,17.432,0,5.873,18.94,0,1.077],
// 4 72 17.062 0 5.625 16.626 0 5.539 14.555 0 1.077 18.94 0 1.077
  [4,72,17.062,0,5.625,16.626,0,5.539,14.555,0,1.077,18.94,0,1.077],
// 3 72 17.432 0 5.873 17.062 0 5.625 18.94 0 1.077
  [3,72,17.432,0,5.873,17.062,0,5.625,18.94,0,1.077],
// 4 0 15.819 0 5.873 16.189 0 5.625 16.626 0 5.539 17.062 0 5.625
  [4,0,15.819,0,5.873,16.189,0,5.625,16.626,0,5.539,17.062,0,5.625],
// 3 72 14.555 0 1.077 16.626 0 5.539 16.189 0 5.625
  [3,72,14.555,0,1.077,16.626,0,5.539,16.189,0,5.625],
// 4 0 16.626 0 7.821 15.571 0 6.243 15.819 0 5.873 17.68 0 6.243
  [4,0,16.626,0,7.821,15.571,0,6.243,15.819,0,5.873,17.68,0,6.243],
// 3 72 14.555 0 1.077 16.189 0 5.625 15.819 0 5.873
  [3,72,14.555,0,1.077,16.189,0,5.625,15.819,0,5.873],
// 4 0 15.819 0 7.486 15.571 0 7.116 15.571 0 6.243 16.626 0 7.821
  [4,0,15.819,0,7.486,15.571,0,7.116,15.571,0,6.243,16.626,0,7.821],
// 3 72 14.555 0 1.077 15.819 0 5.873 15.571 0 6.243
  [3,72,14.555,0,1.077,15.819,0,5.873,15.571,0,6.243],
// 4 72 15.571 0 6.243 15.485 0 6.68 14.538 0 9.043 14.555 0 1.077
  [4,72,15.571,0,6.243,15.485,0,6.68,14.538,0,9.043,14.555,0,1.077],
// 3 0 15.485 0 6.68 15.571 0 6.243 15.571 0 7.116
  [3,0,15.485,0,6.68,15.571,0,6.243,15.571,0,7.116],
// 3 72 14.538 0 9.043 15.485 0 6.68 15.571 0 7.116
  [3,72,14.538,0,9.043,15.485,0,6.68,15.571,0,7.116],
// 3 72 14.538 0 9.043 15.571 0 7.116 15.819 0 7.486
  [3,72,14.538,0,9.043,15.571,0,7.116,15.819,0,7.486],
// 3 0 16.189 0 7.734 15.819 0 7.486 16.626 0 7.821
  [3,0,16.189,0,7.734,15.819,0,7.486,16.626,0,7.821],
// 3 72 14.538 0 9.043 15.819 0 7.486 16.189 0 7.734
  [3,72,14.538,0,9.043,15.819,0,7.486,16.189,0,7.734],
// 4 72 16.189 0 7.734 16.626 0 7.821 18.923 0 9.038 14.538 0 9.043
  [4,72,16.189,0,7.734,16.626,0,7.821,18.923,0,9.038,14.538,0,9.043],
// 3 72 18.923 0 9.038 16.626 0 7.821 17.062 0 7.734
  [3,72,18.923,0,9.038,16.626,0,7.821,17.062,0,7.734],
// 3 0 17.432 0 7.486 17.062 0 7.734 17.68 0 7.116
  [3,0,17.432,0,7.486,17.062,0,7.734,17.68,0,7.116],
// 3 72 18.923 0 9.038 17.062 0 7.734 17.432 0 7.486
  [3,72,18.923,0,9.038,17.062,0,7.734,17.432,0,7.486],
// 4 0 17.68 0 6.243 17.68 0 7.116 17.062 0 7.734 16.626 0 7.821
  [4,0,17.68,0,6.243,17.68,0,7.116,17.062,0,7.734,16.626,0,7.821],
// 3 72 18.923 0 9.038 17.432 0 7.486 17.68 0 7.116
  [3,72,18.923,0,9.038,17.432,0,7.486,17.68,0,7.116],
// 3 0 17.767 0 6.68 17.68 0 7.116 17.68 0 6.243
  [3,0,17.767,0,6.68,17.68,0,7.116,17.68,0,6.243],
// 3 72 18.923 0 9.038 17.68 0 7.116 17.767 0 6.68
  [3,72,18.923,0,9.038,17.68,0,7.116,17.767,0,6.68],
// 3 16 20 0 10 19.41 0 9.672 19.57 0 9.473
  [3,16,20,0,10,19.41,0,9.672,19.57,0,9.473],
// 4 0 19.41 0 9.672 18.923 0 9.038 19.654 0 9.231 19.57 0 9.473
  [4,0,19.41,0,9.672,18.923,0,9.038,19.654,0,9.231,19.57,0,9.473],
// 3 16 20 0 10 19.57 0 9.473 19.654 0 9.231
  [3,16,20,0,10,19.57,0,9.473,19.654,0,9.231],
// 4 16 -12.791 0 -9.726 12.6 0 -9.549 0 0 -3.154 -12.6 0 -9.549
  [4,16,-12.791,0,-9.726,12.6,0,-9.549,0,0,-3.154,-12.6,0,-9.549],
// 4 16 -12.791 0 -9.726 -13.038 0 -9.808 13.038 0 -9.808 12.791 0 -9.726
  [4,16,-12.791,0,-9.726,-13.038,0,-9.808,13.038,0,-9.808,12.791,0,-9.726],
// 3 16 12.791 0 -9.726 12.6 0 -9.549 -12.791 0 -9.726
  [3,16,12.791,0,-9.726,12.6,0,-9.549,-12.791,0,-9.726],
// 3 16 -12.5 0 -9.308 -12.6 0 -9.549 0 0 -3.154
  [3,16,-12.5,0,-9.308,-12.6,0,-9.549,0,0,-3.154],
// 4 0 -12.6 0 -9.549 -13.192 0 -9.077 -13.038 0 -9.808 -12.791 0 -9.726
  [4,0,-12.6,0,-9.549,-13.192,0,-9.077,-13.038,0,-9.808,-12.791,0,-9.726],
// 4 0 -19.615 0 9.346 -18.962 0 9.077 -19.336 0 9.72 -19.51 0 9.559
  [4,0,-19.615,0,9.346,-18.962,0,9.077,-19.336,0,9.72,-19.51,0,9.559],
// 3 16 -20 0 10 -19.51 0 9.559 -19.336 0 9.72
  [3,16,-20,0,10,-19.51,0,9.559,-19.336,0,9.72],
// 4 0 -14.577 0 9.073 -19.115 0 9.808 -19.336 0 9.72 -18.962 0 9.077
  [4,0,-14.577,0,9.073,-19.115,0,9.808,-19.336,0,9.72,-18.962,0,9.077],
// 3 16 -20 0 10 -19.336 0 9.72 -19.115 0 9.808
  [3,16,-20,0,10,-19.336,0,9.72,-19.115,0,9.808],
];
module ldraw_lib__3069bpb2(step=0, col=false, unit=2/5, alt=false, line=0.2, solid=!$preview)
    makepoly(ldraw_lib__3069bpb2(), step=step, col=col, unit=unit, alt=alt, line=line, solid=solid);
ldraw_lib__3069bpb2(line=0.2);
